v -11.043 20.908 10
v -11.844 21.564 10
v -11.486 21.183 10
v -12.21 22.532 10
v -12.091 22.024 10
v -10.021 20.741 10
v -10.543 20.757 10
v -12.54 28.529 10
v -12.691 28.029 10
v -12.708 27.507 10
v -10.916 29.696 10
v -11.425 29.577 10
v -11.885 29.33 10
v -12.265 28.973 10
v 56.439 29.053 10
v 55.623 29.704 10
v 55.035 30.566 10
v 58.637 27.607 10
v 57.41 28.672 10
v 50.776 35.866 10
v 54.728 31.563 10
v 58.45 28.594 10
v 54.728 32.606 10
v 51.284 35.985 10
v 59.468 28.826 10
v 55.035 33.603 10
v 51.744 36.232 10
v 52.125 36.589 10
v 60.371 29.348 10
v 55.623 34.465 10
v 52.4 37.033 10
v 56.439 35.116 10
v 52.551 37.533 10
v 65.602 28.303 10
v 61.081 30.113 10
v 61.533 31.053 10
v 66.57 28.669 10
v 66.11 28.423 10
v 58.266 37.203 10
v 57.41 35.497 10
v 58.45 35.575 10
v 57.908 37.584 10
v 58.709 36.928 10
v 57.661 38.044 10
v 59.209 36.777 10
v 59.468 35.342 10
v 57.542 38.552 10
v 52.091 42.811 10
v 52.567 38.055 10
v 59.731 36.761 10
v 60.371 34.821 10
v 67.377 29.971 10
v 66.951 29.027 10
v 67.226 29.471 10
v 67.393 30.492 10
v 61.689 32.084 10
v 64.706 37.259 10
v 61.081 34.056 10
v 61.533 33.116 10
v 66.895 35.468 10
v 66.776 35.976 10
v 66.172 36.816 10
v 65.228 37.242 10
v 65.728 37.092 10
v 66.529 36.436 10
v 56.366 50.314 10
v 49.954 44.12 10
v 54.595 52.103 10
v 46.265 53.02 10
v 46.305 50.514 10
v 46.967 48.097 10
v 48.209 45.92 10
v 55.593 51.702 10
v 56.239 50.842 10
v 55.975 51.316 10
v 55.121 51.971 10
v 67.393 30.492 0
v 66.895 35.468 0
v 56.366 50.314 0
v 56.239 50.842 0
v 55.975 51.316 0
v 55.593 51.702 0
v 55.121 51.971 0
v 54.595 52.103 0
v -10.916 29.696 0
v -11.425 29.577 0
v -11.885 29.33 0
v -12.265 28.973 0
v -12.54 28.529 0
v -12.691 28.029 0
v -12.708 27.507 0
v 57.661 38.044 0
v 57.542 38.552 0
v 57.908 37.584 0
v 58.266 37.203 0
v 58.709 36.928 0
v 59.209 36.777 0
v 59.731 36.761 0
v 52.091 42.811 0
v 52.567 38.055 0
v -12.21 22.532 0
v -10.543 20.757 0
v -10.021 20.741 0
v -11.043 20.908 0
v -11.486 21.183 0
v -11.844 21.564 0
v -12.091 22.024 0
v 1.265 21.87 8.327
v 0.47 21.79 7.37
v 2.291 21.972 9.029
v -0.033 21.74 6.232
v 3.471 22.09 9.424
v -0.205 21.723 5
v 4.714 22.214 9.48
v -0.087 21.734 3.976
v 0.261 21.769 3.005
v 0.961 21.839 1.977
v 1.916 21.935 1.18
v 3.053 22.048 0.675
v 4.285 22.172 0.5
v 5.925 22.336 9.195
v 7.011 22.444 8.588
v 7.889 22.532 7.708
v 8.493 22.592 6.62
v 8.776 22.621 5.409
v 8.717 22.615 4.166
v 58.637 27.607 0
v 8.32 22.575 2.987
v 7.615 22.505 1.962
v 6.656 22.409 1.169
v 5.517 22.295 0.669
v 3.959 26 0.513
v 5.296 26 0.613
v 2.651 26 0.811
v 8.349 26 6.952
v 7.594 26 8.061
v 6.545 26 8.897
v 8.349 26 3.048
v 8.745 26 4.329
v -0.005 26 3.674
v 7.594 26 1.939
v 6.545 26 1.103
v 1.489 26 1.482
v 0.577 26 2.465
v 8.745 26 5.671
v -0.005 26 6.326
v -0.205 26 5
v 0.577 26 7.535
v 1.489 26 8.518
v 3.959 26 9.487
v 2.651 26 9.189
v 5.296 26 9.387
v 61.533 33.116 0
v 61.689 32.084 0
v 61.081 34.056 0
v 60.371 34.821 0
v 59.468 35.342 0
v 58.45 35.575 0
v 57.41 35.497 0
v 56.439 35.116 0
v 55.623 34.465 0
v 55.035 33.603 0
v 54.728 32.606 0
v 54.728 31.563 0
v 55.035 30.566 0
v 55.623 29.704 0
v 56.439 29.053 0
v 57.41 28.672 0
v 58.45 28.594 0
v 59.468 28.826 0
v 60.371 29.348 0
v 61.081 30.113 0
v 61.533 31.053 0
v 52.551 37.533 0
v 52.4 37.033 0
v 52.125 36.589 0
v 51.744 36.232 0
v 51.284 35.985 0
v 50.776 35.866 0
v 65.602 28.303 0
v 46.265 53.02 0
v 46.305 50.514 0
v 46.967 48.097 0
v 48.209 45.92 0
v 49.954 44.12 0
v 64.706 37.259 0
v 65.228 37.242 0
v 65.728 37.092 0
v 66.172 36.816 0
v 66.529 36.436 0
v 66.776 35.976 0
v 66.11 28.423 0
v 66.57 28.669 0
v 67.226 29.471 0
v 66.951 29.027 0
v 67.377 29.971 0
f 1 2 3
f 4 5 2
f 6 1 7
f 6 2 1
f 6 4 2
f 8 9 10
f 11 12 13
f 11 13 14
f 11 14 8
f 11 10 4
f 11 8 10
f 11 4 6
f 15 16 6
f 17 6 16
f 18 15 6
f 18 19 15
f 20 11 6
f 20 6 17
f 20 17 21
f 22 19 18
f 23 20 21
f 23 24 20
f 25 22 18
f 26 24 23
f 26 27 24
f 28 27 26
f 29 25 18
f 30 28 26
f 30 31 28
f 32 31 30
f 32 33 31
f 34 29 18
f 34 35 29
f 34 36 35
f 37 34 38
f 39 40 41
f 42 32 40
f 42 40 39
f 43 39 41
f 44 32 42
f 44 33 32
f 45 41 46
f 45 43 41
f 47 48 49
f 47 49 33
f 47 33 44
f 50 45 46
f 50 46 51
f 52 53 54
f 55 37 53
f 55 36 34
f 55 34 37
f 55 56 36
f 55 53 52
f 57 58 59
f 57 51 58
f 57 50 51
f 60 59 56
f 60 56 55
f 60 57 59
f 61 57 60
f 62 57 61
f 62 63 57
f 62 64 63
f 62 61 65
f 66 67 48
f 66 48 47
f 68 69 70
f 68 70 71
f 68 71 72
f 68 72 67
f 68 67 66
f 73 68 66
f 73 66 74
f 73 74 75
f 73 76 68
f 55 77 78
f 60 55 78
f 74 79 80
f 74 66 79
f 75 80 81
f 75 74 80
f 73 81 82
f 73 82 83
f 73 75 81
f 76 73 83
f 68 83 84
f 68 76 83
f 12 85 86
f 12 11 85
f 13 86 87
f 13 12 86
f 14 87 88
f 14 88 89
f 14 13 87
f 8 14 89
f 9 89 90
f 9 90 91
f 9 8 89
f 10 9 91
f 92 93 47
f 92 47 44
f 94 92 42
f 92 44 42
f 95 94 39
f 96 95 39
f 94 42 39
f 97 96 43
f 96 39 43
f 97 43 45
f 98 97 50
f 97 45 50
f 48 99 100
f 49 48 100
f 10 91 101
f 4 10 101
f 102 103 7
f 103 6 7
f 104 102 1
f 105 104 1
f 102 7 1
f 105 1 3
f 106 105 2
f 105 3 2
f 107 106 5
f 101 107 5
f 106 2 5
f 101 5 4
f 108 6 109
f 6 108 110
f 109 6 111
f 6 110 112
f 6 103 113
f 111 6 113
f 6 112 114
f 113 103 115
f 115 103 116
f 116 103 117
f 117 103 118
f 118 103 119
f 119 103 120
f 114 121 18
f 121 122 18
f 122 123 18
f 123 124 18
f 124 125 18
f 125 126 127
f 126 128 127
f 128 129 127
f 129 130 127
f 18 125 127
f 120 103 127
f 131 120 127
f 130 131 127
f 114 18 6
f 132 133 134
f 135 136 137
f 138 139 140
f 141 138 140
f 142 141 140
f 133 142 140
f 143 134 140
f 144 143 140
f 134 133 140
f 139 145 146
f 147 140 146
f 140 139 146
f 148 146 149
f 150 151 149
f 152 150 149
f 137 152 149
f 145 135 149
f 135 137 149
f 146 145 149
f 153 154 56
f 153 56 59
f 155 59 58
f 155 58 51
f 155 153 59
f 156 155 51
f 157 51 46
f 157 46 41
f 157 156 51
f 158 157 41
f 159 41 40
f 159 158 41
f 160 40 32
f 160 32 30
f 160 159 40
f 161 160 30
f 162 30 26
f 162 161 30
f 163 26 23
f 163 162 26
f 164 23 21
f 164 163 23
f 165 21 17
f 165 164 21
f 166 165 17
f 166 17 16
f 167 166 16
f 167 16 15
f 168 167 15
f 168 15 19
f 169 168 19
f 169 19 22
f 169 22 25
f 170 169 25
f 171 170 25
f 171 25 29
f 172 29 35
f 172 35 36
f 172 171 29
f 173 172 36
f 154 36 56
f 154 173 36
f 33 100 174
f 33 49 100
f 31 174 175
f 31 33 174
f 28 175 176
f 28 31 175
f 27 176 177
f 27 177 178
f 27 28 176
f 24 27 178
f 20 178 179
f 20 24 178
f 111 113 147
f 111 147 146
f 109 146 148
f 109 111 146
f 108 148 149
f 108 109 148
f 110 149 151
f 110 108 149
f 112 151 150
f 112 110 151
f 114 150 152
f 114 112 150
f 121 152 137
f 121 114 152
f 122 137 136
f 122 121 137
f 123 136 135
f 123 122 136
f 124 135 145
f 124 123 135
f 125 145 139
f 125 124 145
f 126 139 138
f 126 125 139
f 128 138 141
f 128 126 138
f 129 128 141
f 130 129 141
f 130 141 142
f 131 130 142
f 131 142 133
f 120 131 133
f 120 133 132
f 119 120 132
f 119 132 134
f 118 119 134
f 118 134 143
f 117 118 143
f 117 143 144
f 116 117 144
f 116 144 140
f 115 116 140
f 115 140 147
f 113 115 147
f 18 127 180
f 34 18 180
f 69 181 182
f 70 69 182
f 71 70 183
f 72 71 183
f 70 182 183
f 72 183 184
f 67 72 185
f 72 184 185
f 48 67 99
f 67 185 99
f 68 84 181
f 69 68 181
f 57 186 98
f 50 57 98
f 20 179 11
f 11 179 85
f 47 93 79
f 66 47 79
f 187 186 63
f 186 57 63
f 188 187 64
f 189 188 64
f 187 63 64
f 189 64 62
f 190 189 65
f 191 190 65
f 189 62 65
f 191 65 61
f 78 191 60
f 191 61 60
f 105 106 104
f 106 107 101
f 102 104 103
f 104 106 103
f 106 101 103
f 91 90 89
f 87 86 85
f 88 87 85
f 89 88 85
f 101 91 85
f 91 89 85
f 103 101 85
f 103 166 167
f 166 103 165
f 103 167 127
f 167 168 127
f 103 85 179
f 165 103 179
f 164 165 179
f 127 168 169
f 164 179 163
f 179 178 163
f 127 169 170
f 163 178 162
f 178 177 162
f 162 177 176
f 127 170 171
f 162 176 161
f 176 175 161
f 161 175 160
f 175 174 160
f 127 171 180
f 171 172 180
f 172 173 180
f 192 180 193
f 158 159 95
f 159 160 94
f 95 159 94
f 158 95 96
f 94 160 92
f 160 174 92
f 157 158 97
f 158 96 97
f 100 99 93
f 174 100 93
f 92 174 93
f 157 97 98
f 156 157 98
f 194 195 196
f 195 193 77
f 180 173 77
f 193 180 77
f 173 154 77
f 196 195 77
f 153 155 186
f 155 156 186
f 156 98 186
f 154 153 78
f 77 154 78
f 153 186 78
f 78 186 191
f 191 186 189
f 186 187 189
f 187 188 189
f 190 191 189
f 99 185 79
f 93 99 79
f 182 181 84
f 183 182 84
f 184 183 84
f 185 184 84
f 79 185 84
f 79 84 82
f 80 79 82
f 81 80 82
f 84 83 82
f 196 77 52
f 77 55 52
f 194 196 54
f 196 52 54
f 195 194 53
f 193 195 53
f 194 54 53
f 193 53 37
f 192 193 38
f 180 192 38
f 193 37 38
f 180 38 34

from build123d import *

# Parameters (mm, degrees)
SKETCH1_R           = 3.5
BOSS_EXTRUDE1_DEPTH = 10
FILLET1_R           = 2
SKETCH4_R           = 4.5
CUT_EXTRUDE1_DEPTH  = 26
FILLET2_R           = 2


with BuildPart() as part:
    # Sketch1 → Boss-Extrude1 (new body)
    with BuildSketch(Plane.XY):
        with BuildLine():
            Line((57.741071939, 36.562090071), (56.204690111, 51.925908355))
            Line((56.204690111, 51.925908355), (46.264731801, 53.020087861))
            ThreePointArc((46.264731801, 53.020087861), (47.519621722, 46.969136515), (52.091231644, 42.811114916))
            Line((52.091231644, 42.811114916), (52.765885988, 36.064571476))
            Line((52.765885988, 36.064571476), (-12.906568566, 29.49732602))
            Line((-12.906568566, 29.49732602), (-12.011035094, 20.541991308))
            Line((-12.011035094, 20.541991308), (58.63660541, 27.606755359))
            Line((58.63660541, 27.606755359), (67.591940122, 28.50228883))
            Line((67.591940122, 28.50228883), (66.696406651, 37.457623542))
            Line((66.696406651, 37.457623542), (57.741071939, 36.562090071))
        make_face()
        with Locations((58.188838675, 32.084422715)):
            Circle(SKETCH1_R, mode=Mode.SUBTRACT)
    extrude(amount=BOSS_EXTRUDE1_DEPTH)

    # Fillet1
    fillet1_edges = [part.edges().sort_by_distance(p)[0] for p in [
        (56.204690111, 51.925908355, 5),
        (57.741071939, 36.562090071, 5),
        (66.696406651, 37.457623542, 5),
        (67.591940122, 28.50228883, 5),
        (52.765885988, 36.064571476, 5),
    ]]
    fillet(fillet1_edges, radius=FILLET1_R)

    # Sketch4 → Cut-Extrude1 (cut)
    with BuildSketch(Plane(origin=(0, 0, 0), x_dir=(1, 0, 0), z_dir=(0, 1, 0))):
        with Locations(Location((4.295066604, -5, 0), (0, 0, 180))):
            Circle(SKETCH4_R)
    extrude(amount=CUT_EXTRUDE1_DEPTH, mode=Mode.SUBTRACT)

    # Fillet2
    fillet2_edges = [part.edges().sort_by_distance(p)[0] for p in [
        (-12.011035094, 20.541991308, 5),
        (-12.906568566, 29.49732602, 5),
    ]]
    fillet(fillet2_edges, radius=FILLET2_R)


solid = part.part
